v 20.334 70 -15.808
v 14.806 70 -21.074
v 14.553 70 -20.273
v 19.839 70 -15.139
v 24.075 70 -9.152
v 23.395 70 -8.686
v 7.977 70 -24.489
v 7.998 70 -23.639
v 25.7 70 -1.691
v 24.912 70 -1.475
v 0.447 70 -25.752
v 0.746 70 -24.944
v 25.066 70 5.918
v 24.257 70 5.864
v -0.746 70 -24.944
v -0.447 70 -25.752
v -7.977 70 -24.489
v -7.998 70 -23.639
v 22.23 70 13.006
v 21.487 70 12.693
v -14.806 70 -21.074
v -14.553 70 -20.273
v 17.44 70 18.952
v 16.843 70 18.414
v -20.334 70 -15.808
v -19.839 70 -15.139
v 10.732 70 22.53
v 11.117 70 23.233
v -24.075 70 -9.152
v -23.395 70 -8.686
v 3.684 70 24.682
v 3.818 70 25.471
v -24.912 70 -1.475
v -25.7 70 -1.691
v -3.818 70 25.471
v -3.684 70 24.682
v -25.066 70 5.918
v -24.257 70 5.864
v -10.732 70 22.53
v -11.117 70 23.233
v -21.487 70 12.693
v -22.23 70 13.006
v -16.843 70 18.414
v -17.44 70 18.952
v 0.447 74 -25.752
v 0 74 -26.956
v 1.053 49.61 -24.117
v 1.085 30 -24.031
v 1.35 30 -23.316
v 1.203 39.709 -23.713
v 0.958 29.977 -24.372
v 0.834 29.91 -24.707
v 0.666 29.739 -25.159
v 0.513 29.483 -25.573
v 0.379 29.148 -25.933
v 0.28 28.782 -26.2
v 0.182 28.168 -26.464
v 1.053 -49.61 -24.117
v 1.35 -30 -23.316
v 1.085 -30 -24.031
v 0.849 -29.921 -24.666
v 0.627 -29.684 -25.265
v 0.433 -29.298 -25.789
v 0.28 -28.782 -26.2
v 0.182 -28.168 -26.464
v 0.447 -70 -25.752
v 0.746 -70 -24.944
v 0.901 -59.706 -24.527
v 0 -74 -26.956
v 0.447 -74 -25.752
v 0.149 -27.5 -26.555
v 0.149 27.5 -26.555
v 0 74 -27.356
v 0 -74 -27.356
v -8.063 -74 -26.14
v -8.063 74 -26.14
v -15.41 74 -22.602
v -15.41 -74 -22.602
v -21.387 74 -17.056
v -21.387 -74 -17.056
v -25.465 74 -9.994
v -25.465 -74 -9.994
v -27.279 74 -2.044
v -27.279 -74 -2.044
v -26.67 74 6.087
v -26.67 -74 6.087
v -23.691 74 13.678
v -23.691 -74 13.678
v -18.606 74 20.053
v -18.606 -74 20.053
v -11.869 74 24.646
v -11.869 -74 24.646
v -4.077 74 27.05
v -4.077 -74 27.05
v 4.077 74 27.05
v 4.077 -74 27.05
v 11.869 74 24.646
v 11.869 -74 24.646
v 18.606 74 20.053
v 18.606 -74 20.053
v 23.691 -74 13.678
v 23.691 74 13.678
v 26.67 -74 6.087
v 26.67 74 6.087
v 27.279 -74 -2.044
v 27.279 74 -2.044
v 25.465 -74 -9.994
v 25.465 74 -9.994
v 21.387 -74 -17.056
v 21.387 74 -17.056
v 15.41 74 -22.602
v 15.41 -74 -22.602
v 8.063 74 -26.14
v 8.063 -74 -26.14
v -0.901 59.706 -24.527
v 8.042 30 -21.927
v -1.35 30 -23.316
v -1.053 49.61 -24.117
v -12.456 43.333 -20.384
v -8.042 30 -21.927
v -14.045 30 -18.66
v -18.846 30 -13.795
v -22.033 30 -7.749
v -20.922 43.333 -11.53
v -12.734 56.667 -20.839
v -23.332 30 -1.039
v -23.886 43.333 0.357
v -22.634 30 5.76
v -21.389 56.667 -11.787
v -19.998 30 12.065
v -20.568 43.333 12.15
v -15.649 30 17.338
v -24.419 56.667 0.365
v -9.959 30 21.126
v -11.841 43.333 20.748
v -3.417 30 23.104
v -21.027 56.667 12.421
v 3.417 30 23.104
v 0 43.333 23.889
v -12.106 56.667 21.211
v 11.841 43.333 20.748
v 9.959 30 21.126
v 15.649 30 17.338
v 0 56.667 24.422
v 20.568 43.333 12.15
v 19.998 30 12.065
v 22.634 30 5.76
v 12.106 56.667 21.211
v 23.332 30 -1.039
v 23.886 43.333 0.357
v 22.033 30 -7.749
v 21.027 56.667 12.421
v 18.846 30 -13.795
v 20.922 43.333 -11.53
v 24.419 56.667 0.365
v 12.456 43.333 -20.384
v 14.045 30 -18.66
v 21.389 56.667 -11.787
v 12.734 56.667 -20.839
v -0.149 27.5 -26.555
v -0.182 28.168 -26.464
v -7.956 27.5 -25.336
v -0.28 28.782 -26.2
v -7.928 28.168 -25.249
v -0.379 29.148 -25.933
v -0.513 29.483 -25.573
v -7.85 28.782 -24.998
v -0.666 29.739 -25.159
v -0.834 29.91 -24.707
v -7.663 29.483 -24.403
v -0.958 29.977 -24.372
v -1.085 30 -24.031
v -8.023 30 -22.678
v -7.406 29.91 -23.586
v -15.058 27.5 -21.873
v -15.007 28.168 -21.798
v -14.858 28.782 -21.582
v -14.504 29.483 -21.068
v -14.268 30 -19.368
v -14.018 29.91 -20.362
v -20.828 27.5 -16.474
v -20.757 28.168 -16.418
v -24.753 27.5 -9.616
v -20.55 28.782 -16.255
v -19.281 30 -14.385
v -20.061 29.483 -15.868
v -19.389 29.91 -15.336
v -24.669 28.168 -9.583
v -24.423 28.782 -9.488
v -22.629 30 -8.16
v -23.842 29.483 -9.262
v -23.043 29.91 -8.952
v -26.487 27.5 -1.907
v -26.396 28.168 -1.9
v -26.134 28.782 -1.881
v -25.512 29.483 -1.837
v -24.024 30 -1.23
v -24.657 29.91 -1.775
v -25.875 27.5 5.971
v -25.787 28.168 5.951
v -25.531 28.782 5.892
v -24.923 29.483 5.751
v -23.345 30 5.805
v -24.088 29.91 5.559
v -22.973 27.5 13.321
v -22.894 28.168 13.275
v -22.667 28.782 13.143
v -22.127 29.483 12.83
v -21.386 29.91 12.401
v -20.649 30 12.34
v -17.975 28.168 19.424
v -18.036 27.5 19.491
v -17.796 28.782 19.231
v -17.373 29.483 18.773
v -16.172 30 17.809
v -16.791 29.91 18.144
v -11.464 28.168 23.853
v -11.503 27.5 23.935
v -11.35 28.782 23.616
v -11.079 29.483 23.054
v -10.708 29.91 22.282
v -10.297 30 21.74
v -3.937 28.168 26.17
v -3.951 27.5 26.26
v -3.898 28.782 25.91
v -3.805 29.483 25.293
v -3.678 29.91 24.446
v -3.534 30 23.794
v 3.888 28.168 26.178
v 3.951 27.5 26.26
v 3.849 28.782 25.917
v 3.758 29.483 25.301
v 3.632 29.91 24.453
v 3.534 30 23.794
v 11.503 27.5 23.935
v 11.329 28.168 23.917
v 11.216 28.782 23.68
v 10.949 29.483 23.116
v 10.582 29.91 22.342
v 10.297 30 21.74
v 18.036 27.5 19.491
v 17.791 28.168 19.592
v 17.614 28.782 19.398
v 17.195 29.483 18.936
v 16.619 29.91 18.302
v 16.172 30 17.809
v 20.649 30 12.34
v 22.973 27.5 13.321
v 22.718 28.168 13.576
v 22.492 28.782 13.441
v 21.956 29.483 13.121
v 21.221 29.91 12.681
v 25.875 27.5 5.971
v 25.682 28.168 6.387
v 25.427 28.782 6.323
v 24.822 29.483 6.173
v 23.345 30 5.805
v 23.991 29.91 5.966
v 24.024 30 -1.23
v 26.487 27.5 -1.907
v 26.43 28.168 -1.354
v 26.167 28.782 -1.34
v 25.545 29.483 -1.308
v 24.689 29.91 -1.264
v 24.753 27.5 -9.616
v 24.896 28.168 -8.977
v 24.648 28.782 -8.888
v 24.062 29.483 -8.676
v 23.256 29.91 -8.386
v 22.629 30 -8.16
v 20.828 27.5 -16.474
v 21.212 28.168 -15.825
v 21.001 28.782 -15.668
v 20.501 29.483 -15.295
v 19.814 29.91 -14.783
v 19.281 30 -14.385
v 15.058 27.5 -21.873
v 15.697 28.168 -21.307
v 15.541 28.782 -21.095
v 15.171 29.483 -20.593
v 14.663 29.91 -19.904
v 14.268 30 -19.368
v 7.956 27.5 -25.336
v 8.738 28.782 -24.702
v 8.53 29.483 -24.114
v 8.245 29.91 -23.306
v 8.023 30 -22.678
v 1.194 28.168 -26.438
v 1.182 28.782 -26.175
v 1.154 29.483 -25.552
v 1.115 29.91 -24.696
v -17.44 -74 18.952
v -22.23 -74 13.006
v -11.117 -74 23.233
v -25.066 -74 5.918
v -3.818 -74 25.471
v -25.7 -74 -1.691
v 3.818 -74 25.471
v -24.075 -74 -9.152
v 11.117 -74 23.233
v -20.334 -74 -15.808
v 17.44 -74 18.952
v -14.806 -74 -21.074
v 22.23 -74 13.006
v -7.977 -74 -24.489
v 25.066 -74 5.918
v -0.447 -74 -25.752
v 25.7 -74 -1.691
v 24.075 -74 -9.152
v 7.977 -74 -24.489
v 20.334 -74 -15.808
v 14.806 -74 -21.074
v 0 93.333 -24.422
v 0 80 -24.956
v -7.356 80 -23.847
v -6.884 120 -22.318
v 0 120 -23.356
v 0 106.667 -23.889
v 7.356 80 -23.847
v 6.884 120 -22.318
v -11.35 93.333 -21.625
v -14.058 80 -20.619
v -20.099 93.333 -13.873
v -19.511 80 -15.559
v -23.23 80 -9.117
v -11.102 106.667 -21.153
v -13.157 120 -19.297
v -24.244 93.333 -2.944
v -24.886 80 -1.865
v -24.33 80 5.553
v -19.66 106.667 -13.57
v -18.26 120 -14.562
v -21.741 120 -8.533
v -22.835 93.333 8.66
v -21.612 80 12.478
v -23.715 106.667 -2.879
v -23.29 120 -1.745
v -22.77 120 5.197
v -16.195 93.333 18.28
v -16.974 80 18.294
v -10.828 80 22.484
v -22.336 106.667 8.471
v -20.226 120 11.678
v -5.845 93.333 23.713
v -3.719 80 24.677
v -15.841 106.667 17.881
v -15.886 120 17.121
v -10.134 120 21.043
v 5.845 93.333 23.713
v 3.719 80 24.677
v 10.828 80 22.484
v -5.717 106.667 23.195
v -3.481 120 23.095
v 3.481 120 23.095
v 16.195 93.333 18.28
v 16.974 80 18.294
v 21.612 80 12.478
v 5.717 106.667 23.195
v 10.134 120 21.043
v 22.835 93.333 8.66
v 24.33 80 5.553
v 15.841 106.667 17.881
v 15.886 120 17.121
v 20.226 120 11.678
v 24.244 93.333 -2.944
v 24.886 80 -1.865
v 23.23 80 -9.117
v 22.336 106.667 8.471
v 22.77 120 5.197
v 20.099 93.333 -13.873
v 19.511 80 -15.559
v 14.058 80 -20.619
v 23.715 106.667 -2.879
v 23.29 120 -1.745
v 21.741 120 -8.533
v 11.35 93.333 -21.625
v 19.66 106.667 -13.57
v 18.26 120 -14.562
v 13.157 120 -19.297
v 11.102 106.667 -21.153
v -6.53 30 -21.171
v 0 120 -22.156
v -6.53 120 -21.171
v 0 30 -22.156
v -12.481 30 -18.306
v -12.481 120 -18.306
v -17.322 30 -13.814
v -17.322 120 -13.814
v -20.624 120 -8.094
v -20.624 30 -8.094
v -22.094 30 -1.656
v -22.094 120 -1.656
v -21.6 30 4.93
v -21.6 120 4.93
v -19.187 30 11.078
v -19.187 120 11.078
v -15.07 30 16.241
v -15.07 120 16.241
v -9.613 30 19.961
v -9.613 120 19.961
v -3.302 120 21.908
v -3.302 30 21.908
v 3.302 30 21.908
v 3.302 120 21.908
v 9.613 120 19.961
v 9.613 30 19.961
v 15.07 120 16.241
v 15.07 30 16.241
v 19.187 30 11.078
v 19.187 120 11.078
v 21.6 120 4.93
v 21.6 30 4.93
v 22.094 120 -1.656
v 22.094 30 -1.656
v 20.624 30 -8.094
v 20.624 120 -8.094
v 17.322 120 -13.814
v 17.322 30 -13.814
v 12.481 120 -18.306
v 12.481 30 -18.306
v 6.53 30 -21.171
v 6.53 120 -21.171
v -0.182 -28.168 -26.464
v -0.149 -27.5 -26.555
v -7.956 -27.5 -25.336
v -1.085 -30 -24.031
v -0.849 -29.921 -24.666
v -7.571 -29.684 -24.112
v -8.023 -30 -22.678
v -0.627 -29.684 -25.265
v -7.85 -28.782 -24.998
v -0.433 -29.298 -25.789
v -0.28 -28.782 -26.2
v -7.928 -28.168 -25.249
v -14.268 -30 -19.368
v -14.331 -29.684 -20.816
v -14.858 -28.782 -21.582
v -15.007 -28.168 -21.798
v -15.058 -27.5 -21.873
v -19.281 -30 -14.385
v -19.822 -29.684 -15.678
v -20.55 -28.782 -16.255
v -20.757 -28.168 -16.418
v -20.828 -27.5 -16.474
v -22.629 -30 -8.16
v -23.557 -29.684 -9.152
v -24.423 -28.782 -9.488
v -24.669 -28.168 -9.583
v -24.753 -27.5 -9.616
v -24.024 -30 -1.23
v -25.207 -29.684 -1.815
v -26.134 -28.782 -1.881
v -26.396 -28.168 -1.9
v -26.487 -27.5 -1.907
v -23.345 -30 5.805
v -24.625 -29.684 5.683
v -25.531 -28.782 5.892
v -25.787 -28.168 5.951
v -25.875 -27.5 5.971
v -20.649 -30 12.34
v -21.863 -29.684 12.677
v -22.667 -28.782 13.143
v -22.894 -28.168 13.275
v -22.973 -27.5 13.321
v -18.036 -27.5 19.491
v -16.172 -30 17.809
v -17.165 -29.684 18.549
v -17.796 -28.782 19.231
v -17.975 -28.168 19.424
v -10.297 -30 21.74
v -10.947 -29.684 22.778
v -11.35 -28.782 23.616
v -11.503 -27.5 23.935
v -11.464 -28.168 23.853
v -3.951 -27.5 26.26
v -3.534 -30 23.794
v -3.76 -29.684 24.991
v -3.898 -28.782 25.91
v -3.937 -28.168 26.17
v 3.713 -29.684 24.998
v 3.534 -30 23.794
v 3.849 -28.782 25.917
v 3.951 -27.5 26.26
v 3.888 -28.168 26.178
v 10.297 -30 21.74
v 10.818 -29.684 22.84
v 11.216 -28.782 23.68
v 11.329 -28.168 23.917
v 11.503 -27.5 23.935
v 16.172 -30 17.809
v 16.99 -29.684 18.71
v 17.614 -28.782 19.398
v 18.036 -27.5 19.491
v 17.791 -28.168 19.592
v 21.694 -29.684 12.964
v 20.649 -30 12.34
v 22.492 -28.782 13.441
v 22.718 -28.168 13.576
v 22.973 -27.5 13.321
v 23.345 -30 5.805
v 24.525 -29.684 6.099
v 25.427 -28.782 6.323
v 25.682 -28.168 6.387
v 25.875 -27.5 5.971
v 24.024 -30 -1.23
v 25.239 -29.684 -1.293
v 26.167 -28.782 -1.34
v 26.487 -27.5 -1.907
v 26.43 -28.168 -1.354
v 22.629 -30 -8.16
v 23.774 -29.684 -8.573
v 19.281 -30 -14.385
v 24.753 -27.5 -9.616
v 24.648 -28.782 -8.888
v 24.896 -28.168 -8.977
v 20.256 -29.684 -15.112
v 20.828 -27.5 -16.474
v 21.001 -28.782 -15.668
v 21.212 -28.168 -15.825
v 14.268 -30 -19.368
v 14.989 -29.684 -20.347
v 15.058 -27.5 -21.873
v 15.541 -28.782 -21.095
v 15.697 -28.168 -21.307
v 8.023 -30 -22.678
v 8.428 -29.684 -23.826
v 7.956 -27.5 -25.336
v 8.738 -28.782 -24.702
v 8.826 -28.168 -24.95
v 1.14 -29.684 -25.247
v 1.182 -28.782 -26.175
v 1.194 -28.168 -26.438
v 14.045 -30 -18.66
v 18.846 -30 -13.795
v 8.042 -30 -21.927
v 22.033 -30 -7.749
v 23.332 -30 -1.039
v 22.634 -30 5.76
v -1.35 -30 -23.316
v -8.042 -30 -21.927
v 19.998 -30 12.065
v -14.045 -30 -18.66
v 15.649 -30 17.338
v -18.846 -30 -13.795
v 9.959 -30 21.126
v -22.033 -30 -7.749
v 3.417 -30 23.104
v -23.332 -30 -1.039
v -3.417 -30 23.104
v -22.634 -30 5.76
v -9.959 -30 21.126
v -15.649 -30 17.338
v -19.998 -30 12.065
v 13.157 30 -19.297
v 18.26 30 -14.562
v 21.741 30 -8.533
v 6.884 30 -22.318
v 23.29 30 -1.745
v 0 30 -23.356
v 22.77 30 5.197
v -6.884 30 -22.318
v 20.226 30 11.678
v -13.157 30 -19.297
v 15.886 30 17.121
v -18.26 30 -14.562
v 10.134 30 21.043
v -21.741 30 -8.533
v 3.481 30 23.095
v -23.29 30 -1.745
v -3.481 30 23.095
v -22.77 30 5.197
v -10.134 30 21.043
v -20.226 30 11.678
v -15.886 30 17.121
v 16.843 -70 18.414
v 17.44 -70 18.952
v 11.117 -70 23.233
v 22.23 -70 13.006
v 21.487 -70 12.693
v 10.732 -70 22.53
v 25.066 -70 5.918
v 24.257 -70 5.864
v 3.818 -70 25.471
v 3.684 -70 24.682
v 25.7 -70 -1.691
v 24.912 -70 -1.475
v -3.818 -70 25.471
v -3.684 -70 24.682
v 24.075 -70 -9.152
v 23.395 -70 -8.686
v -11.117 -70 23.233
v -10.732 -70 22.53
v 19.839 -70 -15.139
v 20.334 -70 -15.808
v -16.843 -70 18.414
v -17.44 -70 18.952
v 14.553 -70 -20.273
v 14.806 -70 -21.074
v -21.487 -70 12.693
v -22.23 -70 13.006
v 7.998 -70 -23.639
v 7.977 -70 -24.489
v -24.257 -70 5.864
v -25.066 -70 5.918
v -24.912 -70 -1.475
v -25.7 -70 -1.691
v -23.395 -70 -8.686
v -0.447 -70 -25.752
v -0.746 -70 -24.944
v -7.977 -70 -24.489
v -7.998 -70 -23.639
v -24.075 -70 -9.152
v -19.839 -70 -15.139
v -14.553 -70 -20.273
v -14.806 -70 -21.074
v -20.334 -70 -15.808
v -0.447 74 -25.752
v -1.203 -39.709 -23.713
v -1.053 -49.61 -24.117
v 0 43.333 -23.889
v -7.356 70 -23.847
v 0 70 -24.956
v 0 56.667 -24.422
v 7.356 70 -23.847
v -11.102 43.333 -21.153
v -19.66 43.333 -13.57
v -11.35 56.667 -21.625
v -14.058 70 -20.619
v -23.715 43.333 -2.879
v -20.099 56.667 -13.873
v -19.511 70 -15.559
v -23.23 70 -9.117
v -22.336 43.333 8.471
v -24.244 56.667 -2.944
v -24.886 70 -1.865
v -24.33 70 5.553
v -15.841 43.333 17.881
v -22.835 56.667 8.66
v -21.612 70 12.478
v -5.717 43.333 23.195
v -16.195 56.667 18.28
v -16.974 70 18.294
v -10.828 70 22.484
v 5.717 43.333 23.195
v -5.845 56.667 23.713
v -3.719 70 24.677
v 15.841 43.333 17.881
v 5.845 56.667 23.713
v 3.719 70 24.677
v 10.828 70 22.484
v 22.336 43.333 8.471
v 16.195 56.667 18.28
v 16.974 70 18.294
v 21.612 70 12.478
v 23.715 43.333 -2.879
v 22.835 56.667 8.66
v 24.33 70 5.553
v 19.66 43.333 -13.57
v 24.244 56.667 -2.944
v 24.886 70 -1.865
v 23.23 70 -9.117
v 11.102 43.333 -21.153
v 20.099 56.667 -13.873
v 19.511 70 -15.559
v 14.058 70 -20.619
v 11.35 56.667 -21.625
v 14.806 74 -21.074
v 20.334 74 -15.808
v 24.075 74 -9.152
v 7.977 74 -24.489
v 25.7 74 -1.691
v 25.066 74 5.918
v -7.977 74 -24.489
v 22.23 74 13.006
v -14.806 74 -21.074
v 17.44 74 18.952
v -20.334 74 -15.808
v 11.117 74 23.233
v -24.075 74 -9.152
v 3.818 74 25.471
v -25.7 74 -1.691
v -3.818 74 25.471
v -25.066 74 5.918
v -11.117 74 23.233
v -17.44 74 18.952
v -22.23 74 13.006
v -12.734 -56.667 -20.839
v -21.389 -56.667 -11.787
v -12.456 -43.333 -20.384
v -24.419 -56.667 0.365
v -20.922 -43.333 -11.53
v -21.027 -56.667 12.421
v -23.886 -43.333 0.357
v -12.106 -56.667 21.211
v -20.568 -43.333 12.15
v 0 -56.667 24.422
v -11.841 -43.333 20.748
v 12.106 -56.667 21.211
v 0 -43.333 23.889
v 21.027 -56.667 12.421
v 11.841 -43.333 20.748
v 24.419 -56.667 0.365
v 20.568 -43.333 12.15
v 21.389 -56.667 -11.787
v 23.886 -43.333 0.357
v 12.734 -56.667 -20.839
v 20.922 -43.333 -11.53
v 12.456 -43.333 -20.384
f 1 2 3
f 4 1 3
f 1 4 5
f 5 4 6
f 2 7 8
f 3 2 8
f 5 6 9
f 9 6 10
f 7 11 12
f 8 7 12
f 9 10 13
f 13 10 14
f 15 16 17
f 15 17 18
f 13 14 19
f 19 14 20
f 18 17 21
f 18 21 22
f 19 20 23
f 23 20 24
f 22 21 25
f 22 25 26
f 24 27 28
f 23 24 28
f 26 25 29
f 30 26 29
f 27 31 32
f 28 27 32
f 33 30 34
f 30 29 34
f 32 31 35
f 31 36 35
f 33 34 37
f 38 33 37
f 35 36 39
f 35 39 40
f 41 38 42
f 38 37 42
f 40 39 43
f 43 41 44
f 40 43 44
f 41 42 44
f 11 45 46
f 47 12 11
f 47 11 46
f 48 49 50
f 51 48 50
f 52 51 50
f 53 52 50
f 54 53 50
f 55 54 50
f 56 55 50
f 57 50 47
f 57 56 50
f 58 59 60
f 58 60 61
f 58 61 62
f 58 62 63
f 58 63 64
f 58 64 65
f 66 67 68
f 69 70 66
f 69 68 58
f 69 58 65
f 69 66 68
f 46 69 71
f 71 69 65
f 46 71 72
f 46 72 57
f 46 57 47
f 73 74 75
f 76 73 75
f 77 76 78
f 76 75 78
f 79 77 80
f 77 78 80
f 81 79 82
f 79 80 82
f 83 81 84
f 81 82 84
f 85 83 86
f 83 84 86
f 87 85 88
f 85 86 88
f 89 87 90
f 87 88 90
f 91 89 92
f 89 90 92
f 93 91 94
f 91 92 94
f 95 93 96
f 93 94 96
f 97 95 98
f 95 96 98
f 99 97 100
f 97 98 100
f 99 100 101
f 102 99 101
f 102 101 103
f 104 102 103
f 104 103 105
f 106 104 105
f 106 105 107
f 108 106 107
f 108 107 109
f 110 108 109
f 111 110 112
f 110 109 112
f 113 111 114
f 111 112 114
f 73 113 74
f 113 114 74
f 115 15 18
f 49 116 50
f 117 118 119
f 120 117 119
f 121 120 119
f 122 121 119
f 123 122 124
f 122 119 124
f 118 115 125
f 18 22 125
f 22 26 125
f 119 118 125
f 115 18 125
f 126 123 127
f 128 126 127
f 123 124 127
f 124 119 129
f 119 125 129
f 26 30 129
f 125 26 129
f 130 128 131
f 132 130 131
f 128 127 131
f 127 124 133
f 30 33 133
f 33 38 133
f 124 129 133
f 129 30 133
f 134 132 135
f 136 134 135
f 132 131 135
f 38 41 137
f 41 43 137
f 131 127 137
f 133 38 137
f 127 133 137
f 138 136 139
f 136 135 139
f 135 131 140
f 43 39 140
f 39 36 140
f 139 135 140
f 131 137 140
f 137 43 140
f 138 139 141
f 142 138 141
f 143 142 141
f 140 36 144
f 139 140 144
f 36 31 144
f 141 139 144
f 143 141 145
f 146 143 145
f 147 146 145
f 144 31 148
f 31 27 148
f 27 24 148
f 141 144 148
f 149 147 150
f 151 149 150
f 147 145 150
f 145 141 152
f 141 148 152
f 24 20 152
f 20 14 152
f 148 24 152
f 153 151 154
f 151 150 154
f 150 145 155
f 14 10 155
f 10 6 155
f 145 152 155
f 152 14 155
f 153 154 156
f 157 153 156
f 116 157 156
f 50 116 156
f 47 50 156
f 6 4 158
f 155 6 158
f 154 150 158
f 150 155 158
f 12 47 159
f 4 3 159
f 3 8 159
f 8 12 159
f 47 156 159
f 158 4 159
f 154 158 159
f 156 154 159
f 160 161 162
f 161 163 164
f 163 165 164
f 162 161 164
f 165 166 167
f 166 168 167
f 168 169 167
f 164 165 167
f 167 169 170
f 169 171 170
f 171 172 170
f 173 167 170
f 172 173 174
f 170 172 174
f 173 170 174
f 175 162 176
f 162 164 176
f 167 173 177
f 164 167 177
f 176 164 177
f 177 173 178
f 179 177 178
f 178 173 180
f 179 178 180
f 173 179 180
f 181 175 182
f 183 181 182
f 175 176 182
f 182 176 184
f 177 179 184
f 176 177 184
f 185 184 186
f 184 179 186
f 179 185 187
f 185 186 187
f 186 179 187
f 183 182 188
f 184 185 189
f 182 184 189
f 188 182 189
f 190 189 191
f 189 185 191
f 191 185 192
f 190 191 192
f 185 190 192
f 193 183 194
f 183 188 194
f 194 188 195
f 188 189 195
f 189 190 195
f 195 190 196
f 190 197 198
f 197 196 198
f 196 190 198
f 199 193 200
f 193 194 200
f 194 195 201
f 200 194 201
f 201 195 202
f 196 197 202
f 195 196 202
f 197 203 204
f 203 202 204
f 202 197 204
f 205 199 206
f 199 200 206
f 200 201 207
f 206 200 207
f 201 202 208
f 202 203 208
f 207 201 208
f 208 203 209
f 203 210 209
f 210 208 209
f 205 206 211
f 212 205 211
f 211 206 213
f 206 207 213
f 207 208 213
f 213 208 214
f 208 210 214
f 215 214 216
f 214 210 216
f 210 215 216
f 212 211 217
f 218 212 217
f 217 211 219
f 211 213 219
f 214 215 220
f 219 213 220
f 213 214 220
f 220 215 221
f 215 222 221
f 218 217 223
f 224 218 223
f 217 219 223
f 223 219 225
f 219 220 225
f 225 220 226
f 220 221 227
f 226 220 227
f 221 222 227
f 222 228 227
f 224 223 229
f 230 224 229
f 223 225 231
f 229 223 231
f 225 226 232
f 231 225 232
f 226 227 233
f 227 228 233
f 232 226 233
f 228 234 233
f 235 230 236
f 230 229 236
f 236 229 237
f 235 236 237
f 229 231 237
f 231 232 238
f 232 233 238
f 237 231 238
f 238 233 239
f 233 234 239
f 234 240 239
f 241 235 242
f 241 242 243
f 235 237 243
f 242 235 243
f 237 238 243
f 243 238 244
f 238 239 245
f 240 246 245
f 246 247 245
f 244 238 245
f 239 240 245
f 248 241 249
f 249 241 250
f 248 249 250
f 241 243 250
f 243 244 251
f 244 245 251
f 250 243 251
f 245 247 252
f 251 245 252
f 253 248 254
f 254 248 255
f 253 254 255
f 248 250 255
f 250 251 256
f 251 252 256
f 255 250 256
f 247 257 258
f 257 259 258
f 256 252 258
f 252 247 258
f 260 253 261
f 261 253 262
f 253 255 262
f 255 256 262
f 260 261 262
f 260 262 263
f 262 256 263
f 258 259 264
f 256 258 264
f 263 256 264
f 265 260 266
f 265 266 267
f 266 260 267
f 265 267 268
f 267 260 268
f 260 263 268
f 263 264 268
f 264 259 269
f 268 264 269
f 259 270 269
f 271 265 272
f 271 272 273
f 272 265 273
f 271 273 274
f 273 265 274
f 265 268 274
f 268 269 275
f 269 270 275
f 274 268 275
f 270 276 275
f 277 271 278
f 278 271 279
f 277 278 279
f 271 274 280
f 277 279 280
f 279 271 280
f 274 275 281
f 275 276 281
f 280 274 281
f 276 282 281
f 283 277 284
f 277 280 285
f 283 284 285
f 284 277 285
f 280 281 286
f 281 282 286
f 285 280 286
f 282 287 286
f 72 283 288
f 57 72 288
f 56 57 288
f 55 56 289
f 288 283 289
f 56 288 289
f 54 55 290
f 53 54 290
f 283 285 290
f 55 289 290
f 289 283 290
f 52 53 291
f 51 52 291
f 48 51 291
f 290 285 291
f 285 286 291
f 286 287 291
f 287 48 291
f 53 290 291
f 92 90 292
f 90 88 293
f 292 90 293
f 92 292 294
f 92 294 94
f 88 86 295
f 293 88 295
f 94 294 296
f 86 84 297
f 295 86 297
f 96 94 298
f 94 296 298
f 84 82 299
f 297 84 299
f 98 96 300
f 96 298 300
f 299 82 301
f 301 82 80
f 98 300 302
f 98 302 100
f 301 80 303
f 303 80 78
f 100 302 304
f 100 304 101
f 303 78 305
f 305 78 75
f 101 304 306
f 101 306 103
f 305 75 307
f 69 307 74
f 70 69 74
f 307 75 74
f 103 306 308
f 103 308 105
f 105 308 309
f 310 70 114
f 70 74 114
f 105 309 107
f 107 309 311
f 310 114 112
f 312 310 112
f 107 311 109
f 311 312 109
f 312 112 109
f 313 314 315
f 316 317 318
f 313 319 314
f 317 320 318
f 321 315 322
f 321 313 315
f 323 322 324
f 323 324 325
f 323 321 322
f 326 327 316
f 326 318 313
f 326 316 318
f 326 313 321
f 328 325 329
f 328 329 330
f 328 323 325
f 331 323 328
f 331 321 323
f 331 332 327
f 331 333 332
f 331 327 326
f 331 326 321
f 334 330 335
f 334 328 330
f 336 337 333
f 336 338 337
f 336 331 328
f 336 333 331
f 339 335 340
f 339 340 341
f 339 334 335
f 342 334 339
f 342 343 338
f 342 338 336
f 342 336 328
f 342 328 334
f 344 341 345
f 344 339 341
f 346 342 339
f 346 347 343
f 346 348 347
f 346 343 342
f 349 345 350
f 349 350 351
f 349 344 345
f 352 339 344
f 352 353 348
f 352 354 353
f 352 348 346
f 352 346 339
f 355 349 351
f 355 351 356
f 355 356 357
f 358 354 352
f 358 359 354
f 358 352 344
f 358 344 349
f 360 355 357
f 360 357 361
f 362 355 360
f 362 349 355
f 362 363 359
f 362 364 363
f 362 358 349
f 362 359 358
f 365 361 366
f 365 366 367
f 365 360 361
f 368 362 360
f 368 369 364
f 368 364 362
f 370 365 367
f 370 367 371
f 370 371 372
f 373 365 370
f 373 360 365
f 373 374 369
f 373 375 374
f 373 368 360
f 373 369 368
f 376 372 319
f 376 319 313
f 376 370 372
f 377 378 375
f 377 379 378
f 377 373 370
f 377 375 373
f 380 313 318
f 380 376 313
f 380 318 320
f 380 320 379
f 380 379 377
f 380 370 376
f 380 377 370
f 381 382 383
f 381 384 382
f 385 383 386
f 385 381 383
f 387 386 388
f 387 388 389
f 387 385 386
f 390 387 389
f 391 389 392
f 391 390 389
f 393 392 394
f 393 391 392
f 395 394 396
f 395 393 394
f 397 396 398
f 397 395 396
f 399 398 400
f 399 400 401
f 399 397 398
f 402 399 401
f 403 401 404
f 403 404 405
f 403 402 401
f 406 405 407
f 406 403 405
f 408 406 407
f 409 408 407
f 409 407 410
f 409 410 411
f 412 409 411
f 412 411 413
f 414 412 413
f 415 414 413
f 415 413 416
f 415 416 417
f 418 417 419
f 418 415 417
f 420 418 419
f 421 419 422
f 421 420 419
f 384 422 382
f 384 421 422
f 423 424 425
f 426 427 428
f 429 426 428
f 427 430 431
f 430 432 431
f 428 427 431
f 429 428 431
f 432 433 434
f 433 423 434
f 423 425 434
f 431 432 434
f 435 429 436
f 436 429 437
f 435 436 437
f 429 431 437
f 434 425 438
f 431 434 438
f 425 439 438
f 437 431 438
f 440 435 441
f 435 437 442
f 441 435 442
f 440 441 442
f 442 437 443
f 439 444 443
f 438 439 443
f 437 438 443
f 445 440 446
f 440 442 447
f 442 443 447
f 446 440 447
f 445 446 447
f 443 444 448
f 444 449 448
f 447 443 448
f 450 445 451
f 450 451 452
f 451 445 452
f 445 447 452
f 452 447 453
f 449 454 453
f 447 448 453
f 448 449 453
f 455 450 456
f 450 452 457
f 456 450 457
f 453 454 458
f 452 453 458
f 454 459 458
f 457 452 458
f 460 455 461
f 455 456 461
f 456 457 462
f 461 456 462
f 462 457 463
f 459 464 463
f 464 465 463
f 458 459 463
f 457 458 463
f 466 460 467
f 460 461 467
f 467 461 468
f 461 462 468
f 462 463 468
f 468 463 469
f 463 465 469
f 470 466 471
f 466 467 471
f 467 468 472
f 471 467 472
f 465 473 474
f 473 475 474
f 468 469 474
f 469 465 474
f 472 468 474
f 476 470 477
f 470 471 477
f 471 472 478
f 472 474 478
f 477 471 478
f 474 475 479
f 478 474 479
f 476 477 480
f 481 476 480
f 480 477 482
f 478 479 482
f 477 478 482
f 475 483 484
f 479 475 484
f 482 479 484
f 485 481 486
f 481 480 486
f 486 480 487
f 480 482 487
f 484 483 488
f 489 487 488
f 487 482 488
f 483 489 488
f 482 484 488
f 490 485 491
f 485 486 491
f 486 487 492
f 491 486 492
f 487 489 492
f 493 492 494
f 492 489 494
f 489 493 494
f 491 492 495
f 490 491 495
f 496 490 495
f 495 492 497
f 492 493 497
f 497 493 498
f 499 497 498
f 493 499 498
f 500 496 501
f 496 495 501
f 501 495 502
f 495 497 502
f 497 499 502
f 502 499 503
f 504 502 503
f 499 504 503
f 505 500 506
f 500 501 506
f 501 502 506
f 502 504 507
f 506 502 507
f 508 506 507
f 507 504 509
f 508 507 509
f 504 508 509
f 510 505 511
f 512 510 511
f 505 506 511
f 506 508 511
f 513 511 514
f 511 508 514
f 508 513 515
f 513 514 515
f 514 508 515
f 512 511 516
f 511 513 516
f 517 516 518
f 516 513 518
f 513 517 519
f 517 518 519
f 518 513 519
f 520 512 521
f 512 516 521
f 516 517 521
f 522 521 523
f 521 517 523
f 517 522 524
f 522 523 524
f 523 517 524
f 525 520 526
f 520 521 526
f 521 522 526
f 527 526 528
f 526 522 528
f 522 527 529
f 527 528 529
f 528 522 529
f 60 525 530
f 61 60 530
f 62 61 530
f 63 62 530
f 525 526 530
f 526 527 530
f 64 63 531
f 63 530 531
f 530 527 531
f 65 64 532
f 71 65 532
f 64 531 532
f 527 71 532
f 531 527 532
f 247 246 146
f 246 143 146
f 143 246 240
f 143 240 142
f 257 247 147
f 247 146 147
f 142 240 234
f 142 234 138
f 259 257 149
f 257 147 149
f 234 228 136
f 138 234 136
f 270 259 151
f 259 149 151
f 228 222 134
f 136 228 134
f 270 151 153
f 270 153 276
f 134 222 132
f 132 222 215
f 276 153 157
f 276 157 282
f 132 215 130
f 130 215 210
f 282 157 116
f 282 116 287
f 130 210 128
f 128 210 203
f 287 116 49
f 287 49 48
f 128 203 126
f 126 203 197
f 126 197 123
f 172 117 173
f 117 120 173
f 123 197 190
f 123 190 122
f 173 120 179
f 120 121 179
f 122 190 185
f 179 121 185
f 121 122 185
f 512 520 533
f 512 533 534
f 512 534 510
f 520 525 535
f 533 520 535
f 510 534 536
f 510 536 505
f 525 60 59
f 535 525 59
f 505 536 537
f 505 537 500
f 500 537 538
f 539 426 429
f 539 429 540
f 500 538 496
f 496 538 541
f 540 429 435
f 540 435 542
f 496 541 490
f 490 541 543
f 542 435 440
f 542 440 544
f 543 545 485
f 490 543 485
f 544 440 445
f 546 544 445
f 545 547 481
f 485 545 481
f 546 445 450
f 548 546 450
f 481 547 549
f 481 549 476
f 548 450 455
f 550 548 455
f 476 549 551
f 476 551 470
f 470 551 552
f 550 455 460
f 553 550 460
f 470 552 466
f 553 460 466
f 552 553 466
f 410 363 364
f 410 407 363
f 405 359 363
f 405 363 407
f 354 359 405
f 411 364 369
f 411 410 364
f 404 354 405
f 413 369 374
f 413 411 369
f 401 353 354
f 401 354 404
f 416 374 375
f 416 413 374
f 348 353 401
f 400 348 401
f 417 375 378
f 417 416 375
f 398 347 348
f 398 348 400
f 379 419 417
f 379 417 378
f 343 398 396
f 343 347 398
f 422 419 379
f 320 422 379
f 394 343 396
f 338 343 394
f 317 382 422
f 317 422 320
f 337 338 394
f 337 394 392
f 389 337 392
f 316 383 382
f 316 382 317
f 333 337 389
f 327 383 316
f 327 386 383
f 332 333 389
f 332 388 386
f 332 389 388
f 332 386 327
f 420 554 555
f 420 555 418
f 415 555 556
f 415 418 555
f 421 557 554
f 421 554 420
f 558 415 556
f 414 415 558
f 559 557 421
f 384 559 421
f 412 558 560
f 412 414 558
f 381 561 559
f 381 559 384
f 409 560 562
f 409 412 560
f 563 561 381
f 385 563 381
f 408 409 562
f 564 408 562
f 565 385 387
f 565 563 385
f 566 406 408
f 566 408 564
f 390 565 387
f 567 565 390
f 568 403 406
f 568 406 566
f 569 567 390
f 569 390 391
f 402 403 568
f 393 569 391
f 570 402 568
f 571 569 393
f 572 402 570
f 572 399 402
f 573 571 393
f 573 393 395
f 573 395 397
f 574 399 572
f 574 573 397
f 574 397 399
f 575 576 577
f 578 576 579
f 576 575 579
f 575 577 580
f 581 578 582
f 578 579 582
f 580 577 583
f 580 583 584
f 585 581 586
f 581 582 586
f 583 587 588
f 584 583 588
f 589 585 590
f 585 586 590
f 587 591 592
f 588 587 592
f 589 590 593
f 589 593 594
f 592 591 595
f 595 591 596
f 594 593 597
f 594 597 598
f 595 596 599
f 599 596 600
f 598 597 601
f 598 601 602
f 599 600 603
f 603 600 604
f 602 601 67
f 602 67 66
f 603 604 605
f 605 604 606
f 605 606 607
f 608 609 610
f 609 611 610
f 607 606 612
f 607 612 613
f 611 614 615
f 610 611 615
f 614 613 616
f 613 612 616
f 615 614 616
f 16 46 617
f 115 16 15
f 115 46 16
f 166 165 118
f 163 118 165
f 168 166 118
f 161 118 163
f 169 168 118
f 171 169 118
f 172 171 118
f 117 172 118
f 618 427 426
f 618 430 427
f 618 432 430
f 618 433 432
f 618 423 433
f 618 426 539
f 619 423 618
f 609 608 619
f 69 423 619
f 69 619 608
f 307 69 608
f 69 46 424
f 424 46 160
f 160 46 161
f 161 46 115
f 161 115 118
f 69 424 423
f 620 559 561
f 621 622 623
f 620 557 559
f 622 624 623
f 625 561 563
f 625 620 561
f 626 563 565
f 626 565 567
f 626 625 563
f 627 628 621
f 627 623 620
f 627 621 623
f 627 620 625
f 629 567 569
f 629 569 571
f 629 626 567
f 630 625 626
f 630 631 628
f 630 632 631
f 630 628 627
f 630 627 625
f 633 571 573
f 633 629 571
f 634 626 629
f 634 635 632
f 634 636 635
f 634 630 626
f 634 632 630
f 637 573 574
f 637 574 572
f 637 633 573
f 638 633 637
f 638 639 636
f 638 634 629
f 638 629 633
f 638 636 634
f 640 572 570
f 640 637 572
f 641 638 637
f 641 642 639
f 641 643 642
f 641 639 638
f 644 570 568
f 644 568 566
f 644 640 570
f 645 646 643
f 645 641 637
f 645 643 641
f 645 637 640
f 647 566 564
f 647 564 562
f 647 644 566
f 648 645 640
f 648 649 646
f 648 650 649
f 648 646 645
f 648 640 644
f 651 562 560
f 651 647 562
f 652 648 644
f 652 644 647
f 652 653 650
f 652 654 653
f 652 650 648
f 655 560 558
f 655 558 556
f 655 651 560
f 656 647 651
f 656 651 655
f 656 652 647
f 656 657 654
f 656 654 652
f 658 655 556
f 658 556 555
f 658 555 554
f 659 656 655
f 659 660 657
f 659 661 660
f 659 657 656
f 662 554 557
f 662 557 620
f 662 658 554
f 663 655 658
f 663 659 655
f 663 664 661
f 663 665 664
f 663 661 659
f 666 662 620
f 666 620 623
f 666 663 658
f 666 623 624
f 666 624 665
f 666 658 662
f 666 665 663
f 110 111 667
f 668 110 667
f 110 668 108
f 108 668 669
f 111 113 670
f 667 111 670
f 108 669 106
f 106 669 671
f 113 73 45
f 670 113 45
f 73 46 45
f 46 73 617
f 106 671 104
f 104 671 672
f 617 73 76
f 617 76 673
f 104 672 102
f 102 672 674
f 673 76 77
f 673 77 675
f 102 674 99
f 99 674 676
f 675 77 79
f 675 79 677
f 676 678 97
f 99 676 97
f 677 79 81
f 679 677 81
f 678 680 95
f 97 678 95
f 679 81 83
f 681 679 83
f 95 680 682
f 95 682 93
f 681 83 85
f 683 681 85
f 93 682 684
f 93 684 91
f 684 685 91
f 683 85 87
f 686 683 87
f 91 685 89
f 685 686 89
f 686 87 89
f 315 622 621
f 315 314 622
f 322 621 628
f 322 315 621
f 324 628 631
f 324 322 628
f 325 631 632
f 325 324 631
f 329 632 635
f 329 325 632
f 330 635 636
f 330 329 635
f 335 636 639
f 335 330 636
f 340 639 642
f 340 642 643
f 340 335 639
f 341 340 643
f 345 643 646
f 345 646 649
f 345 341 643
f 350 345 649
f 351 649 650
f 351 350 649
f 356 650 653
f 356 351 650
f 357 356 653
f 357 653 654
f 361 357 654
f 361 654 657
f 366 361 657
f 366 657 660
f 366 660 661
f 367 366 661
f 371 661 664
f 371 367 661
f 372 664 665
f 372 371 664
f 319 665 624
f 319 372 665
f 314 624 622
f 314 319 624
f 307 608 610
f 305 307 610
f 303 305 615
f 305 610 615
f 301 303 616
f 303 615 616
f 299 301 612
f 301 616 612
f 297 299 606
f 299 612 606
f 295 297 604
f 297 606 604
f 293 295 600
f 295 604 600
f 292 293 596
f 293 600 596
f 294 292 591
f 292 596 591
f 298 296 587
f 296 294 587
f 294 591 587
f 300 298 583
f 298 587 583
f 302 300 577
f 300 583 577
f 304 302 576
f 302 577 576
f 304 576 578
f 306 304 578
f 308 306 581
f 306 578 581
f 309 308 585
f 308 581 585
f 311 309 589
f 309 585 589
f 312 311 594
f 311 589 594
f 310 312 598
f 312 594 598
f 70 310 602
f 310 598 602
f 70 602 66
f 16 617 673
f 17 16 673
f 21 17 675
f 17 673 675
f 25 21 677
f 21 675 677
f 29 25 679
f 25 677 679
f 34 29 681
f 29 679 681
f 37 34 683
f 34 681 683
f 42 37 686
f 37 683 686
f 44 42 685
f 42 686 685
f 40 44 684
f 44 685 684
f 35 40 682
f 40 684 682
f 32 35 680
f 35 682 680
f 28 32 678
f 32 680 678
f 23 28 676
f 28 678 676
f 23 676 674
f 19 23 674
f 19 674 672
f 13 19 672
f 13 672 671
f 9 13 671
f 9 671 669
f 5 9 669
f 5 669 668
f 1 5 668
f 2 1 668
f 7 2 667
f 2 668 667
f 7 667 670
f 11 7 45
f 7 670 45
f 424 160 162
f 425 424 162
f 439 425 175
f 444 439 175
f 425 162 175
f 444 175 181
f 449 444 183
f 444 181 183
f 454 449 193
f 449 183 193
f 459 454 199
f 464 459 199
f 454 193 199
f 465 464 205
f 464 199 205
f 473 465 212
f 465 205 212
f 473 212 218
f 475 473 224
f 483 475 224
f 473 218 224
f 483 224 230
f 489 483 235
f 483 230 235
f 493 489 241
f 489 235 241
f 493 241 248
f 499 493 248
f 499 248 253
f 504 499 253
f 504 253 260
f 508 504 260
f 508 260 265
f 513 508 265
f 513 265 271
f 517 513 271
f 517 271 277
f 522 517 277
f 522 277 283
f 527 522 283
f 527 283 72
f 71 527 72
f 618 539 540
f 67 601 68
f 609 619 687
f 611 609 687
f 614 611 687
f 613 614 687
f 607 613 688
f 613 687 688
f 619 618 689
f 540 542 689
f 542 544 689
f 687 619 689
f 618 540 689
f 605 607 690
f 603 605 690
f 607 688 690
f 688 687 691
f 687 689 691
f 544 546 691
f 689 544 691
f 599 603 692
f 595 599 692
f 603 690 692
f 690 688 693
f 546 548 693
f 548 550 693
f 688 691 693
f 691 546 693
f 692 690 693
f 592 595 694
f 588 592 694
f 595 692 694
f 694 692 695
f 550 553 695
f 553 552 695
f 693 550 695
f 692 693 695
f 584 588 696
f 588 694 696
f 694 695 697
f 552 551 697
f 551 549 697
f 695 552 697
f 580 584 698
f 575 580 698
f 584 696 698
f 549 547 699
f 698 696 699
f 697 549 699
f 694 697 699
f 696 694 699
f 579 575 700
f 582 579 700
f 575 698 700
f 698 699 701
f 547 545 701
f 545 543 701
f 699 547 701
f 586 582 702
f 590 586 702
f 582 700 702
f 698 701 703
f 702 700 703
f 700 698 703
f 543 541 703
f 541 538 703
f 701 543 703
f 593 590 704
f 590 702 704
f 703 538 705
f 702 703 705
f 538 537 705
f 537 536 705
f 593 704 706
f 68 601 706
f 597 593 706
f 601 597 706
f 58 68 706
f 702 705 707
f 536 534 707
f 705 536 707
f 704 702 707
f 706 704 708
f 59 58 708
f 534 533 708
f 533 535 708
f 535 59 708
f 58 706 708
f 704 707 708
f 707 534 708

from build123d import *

# Parameters (mm, degrees)
FILLET1_R               = 2.5
CUT_EXTRUDE1_DEPTH      = 199.800520021
CUT_EXTRUDE1_DEPTH_BACK = 199.800520021
MOVE_FACE1_BY           = 1
MOVE_START              = -75
MOVE_FACE2_OUTLINE_R    = 27.3555
MOVE_FACE2_DEPTH        = 1


# Read off the part's stored shape, not the designer's step: Move Face2
with BuildPart() as part:
    # Sketch1 → Revolve1 (revolve)
    with BuildSketch(Plane.XY, mode=Mode.PRIVATE) as revolve1_sk:
        Polygon((-27.3555, 75), (-27.3555, -75), (-25.7555, -75), (-25.7555, -70), (-24.9555, -70), (-23.3555, -30), (-26.5555, -30), (-26.5555, 30), (-23.3555, 30), (-24.9555, 70), (-25.7555, 70), (-25.7555, 75), align=None)
    revolve(revolve1_sk.sketch.rotate(Axis((0, 0, 0), (0, 1, 0)), 270), axis=Axis((0, 0, 0), (0, 1, 0)))

    # Fillet1
    fillet1_edges = [part.edges().sort_by_distance(p)[0] for p in [
        (0, 30, 26.5555),
        (0, -30, 26.5555),
    ]]
    fillet(fillet1_edges, radius=FILLET1_R)

    # Sketch3 → Cut-Extrude1 (cut, two sides: drawn at the far end of the back side and taken through both)
    with BuildSketch(Plane(origin=(0, 120, 0), x_dir=(1, 0, 0), z_dir=(0, 1, 0)).offset(-CUT_EXTRUDE1_DEPTH_BACK)):
        Polygon((0, 26.9555), (-10, 0), (10, 0), align=None)
    extrude(amount=CUT_EXTRUDE1_DEPTH + CUT_EXTRUDE1_DEPTH_BACK, mode=Mode.SUBTRACT)

    # Move Face1: a face moved inward by 1.0
    extrude(part.faces().sort_by_distance((21.8844, 75, -13.67775))[0], amount=MOVE_FACE1_BY, dir=(0, -1, 0), mode=Mode.SUBTRACT)

    # Move Face2 outline → Move Face2 (cut)
    with BuildSketch(Plane(origin=(0, 0, 0), x_dir=(1, 0, 0), z_dir=(0, 1, 0)).offset(MOVE_START)):
        Circle(MOVE_FACE2_OUTLINE_R)
        with BuildLine():
            Line((0, 26.9555), (0.446614816, 25.751627433))
            ThreePointArc((0.446614816, 25.751627433), (0, -25.7555), (-0.446614816, 25.751627433))
            Line((-0.446614816, 25.751627433), (0, 26.9555))
        make_face(mode=Mode.SUBTRACT)
    extrude(amount=MOVE_FACE2_DEPTH, mode=Mode.SUBTRACT)


with BuildPart() as body_2:
    # Sketch2 → Revolve2 (revolve)
    with BuildSketch(Plane.XY, mode=Mode.PRIVATE) as revolve2_sk:
        Polygon((-24.9555, 70), (-24.9555, 80), (-23.3555, 120), (-22.1555, 120), (-22.1555, 30), (-23.3555, 30), align=None)
    revolve(revolve2_sk.sketch.rotate(Axis((0, 0, 0), (0, 1, 0)), 270), axis=Axis((0, 0, 0), (0, 1, 0)))


solid = Compound([part.part, body_2.part])
